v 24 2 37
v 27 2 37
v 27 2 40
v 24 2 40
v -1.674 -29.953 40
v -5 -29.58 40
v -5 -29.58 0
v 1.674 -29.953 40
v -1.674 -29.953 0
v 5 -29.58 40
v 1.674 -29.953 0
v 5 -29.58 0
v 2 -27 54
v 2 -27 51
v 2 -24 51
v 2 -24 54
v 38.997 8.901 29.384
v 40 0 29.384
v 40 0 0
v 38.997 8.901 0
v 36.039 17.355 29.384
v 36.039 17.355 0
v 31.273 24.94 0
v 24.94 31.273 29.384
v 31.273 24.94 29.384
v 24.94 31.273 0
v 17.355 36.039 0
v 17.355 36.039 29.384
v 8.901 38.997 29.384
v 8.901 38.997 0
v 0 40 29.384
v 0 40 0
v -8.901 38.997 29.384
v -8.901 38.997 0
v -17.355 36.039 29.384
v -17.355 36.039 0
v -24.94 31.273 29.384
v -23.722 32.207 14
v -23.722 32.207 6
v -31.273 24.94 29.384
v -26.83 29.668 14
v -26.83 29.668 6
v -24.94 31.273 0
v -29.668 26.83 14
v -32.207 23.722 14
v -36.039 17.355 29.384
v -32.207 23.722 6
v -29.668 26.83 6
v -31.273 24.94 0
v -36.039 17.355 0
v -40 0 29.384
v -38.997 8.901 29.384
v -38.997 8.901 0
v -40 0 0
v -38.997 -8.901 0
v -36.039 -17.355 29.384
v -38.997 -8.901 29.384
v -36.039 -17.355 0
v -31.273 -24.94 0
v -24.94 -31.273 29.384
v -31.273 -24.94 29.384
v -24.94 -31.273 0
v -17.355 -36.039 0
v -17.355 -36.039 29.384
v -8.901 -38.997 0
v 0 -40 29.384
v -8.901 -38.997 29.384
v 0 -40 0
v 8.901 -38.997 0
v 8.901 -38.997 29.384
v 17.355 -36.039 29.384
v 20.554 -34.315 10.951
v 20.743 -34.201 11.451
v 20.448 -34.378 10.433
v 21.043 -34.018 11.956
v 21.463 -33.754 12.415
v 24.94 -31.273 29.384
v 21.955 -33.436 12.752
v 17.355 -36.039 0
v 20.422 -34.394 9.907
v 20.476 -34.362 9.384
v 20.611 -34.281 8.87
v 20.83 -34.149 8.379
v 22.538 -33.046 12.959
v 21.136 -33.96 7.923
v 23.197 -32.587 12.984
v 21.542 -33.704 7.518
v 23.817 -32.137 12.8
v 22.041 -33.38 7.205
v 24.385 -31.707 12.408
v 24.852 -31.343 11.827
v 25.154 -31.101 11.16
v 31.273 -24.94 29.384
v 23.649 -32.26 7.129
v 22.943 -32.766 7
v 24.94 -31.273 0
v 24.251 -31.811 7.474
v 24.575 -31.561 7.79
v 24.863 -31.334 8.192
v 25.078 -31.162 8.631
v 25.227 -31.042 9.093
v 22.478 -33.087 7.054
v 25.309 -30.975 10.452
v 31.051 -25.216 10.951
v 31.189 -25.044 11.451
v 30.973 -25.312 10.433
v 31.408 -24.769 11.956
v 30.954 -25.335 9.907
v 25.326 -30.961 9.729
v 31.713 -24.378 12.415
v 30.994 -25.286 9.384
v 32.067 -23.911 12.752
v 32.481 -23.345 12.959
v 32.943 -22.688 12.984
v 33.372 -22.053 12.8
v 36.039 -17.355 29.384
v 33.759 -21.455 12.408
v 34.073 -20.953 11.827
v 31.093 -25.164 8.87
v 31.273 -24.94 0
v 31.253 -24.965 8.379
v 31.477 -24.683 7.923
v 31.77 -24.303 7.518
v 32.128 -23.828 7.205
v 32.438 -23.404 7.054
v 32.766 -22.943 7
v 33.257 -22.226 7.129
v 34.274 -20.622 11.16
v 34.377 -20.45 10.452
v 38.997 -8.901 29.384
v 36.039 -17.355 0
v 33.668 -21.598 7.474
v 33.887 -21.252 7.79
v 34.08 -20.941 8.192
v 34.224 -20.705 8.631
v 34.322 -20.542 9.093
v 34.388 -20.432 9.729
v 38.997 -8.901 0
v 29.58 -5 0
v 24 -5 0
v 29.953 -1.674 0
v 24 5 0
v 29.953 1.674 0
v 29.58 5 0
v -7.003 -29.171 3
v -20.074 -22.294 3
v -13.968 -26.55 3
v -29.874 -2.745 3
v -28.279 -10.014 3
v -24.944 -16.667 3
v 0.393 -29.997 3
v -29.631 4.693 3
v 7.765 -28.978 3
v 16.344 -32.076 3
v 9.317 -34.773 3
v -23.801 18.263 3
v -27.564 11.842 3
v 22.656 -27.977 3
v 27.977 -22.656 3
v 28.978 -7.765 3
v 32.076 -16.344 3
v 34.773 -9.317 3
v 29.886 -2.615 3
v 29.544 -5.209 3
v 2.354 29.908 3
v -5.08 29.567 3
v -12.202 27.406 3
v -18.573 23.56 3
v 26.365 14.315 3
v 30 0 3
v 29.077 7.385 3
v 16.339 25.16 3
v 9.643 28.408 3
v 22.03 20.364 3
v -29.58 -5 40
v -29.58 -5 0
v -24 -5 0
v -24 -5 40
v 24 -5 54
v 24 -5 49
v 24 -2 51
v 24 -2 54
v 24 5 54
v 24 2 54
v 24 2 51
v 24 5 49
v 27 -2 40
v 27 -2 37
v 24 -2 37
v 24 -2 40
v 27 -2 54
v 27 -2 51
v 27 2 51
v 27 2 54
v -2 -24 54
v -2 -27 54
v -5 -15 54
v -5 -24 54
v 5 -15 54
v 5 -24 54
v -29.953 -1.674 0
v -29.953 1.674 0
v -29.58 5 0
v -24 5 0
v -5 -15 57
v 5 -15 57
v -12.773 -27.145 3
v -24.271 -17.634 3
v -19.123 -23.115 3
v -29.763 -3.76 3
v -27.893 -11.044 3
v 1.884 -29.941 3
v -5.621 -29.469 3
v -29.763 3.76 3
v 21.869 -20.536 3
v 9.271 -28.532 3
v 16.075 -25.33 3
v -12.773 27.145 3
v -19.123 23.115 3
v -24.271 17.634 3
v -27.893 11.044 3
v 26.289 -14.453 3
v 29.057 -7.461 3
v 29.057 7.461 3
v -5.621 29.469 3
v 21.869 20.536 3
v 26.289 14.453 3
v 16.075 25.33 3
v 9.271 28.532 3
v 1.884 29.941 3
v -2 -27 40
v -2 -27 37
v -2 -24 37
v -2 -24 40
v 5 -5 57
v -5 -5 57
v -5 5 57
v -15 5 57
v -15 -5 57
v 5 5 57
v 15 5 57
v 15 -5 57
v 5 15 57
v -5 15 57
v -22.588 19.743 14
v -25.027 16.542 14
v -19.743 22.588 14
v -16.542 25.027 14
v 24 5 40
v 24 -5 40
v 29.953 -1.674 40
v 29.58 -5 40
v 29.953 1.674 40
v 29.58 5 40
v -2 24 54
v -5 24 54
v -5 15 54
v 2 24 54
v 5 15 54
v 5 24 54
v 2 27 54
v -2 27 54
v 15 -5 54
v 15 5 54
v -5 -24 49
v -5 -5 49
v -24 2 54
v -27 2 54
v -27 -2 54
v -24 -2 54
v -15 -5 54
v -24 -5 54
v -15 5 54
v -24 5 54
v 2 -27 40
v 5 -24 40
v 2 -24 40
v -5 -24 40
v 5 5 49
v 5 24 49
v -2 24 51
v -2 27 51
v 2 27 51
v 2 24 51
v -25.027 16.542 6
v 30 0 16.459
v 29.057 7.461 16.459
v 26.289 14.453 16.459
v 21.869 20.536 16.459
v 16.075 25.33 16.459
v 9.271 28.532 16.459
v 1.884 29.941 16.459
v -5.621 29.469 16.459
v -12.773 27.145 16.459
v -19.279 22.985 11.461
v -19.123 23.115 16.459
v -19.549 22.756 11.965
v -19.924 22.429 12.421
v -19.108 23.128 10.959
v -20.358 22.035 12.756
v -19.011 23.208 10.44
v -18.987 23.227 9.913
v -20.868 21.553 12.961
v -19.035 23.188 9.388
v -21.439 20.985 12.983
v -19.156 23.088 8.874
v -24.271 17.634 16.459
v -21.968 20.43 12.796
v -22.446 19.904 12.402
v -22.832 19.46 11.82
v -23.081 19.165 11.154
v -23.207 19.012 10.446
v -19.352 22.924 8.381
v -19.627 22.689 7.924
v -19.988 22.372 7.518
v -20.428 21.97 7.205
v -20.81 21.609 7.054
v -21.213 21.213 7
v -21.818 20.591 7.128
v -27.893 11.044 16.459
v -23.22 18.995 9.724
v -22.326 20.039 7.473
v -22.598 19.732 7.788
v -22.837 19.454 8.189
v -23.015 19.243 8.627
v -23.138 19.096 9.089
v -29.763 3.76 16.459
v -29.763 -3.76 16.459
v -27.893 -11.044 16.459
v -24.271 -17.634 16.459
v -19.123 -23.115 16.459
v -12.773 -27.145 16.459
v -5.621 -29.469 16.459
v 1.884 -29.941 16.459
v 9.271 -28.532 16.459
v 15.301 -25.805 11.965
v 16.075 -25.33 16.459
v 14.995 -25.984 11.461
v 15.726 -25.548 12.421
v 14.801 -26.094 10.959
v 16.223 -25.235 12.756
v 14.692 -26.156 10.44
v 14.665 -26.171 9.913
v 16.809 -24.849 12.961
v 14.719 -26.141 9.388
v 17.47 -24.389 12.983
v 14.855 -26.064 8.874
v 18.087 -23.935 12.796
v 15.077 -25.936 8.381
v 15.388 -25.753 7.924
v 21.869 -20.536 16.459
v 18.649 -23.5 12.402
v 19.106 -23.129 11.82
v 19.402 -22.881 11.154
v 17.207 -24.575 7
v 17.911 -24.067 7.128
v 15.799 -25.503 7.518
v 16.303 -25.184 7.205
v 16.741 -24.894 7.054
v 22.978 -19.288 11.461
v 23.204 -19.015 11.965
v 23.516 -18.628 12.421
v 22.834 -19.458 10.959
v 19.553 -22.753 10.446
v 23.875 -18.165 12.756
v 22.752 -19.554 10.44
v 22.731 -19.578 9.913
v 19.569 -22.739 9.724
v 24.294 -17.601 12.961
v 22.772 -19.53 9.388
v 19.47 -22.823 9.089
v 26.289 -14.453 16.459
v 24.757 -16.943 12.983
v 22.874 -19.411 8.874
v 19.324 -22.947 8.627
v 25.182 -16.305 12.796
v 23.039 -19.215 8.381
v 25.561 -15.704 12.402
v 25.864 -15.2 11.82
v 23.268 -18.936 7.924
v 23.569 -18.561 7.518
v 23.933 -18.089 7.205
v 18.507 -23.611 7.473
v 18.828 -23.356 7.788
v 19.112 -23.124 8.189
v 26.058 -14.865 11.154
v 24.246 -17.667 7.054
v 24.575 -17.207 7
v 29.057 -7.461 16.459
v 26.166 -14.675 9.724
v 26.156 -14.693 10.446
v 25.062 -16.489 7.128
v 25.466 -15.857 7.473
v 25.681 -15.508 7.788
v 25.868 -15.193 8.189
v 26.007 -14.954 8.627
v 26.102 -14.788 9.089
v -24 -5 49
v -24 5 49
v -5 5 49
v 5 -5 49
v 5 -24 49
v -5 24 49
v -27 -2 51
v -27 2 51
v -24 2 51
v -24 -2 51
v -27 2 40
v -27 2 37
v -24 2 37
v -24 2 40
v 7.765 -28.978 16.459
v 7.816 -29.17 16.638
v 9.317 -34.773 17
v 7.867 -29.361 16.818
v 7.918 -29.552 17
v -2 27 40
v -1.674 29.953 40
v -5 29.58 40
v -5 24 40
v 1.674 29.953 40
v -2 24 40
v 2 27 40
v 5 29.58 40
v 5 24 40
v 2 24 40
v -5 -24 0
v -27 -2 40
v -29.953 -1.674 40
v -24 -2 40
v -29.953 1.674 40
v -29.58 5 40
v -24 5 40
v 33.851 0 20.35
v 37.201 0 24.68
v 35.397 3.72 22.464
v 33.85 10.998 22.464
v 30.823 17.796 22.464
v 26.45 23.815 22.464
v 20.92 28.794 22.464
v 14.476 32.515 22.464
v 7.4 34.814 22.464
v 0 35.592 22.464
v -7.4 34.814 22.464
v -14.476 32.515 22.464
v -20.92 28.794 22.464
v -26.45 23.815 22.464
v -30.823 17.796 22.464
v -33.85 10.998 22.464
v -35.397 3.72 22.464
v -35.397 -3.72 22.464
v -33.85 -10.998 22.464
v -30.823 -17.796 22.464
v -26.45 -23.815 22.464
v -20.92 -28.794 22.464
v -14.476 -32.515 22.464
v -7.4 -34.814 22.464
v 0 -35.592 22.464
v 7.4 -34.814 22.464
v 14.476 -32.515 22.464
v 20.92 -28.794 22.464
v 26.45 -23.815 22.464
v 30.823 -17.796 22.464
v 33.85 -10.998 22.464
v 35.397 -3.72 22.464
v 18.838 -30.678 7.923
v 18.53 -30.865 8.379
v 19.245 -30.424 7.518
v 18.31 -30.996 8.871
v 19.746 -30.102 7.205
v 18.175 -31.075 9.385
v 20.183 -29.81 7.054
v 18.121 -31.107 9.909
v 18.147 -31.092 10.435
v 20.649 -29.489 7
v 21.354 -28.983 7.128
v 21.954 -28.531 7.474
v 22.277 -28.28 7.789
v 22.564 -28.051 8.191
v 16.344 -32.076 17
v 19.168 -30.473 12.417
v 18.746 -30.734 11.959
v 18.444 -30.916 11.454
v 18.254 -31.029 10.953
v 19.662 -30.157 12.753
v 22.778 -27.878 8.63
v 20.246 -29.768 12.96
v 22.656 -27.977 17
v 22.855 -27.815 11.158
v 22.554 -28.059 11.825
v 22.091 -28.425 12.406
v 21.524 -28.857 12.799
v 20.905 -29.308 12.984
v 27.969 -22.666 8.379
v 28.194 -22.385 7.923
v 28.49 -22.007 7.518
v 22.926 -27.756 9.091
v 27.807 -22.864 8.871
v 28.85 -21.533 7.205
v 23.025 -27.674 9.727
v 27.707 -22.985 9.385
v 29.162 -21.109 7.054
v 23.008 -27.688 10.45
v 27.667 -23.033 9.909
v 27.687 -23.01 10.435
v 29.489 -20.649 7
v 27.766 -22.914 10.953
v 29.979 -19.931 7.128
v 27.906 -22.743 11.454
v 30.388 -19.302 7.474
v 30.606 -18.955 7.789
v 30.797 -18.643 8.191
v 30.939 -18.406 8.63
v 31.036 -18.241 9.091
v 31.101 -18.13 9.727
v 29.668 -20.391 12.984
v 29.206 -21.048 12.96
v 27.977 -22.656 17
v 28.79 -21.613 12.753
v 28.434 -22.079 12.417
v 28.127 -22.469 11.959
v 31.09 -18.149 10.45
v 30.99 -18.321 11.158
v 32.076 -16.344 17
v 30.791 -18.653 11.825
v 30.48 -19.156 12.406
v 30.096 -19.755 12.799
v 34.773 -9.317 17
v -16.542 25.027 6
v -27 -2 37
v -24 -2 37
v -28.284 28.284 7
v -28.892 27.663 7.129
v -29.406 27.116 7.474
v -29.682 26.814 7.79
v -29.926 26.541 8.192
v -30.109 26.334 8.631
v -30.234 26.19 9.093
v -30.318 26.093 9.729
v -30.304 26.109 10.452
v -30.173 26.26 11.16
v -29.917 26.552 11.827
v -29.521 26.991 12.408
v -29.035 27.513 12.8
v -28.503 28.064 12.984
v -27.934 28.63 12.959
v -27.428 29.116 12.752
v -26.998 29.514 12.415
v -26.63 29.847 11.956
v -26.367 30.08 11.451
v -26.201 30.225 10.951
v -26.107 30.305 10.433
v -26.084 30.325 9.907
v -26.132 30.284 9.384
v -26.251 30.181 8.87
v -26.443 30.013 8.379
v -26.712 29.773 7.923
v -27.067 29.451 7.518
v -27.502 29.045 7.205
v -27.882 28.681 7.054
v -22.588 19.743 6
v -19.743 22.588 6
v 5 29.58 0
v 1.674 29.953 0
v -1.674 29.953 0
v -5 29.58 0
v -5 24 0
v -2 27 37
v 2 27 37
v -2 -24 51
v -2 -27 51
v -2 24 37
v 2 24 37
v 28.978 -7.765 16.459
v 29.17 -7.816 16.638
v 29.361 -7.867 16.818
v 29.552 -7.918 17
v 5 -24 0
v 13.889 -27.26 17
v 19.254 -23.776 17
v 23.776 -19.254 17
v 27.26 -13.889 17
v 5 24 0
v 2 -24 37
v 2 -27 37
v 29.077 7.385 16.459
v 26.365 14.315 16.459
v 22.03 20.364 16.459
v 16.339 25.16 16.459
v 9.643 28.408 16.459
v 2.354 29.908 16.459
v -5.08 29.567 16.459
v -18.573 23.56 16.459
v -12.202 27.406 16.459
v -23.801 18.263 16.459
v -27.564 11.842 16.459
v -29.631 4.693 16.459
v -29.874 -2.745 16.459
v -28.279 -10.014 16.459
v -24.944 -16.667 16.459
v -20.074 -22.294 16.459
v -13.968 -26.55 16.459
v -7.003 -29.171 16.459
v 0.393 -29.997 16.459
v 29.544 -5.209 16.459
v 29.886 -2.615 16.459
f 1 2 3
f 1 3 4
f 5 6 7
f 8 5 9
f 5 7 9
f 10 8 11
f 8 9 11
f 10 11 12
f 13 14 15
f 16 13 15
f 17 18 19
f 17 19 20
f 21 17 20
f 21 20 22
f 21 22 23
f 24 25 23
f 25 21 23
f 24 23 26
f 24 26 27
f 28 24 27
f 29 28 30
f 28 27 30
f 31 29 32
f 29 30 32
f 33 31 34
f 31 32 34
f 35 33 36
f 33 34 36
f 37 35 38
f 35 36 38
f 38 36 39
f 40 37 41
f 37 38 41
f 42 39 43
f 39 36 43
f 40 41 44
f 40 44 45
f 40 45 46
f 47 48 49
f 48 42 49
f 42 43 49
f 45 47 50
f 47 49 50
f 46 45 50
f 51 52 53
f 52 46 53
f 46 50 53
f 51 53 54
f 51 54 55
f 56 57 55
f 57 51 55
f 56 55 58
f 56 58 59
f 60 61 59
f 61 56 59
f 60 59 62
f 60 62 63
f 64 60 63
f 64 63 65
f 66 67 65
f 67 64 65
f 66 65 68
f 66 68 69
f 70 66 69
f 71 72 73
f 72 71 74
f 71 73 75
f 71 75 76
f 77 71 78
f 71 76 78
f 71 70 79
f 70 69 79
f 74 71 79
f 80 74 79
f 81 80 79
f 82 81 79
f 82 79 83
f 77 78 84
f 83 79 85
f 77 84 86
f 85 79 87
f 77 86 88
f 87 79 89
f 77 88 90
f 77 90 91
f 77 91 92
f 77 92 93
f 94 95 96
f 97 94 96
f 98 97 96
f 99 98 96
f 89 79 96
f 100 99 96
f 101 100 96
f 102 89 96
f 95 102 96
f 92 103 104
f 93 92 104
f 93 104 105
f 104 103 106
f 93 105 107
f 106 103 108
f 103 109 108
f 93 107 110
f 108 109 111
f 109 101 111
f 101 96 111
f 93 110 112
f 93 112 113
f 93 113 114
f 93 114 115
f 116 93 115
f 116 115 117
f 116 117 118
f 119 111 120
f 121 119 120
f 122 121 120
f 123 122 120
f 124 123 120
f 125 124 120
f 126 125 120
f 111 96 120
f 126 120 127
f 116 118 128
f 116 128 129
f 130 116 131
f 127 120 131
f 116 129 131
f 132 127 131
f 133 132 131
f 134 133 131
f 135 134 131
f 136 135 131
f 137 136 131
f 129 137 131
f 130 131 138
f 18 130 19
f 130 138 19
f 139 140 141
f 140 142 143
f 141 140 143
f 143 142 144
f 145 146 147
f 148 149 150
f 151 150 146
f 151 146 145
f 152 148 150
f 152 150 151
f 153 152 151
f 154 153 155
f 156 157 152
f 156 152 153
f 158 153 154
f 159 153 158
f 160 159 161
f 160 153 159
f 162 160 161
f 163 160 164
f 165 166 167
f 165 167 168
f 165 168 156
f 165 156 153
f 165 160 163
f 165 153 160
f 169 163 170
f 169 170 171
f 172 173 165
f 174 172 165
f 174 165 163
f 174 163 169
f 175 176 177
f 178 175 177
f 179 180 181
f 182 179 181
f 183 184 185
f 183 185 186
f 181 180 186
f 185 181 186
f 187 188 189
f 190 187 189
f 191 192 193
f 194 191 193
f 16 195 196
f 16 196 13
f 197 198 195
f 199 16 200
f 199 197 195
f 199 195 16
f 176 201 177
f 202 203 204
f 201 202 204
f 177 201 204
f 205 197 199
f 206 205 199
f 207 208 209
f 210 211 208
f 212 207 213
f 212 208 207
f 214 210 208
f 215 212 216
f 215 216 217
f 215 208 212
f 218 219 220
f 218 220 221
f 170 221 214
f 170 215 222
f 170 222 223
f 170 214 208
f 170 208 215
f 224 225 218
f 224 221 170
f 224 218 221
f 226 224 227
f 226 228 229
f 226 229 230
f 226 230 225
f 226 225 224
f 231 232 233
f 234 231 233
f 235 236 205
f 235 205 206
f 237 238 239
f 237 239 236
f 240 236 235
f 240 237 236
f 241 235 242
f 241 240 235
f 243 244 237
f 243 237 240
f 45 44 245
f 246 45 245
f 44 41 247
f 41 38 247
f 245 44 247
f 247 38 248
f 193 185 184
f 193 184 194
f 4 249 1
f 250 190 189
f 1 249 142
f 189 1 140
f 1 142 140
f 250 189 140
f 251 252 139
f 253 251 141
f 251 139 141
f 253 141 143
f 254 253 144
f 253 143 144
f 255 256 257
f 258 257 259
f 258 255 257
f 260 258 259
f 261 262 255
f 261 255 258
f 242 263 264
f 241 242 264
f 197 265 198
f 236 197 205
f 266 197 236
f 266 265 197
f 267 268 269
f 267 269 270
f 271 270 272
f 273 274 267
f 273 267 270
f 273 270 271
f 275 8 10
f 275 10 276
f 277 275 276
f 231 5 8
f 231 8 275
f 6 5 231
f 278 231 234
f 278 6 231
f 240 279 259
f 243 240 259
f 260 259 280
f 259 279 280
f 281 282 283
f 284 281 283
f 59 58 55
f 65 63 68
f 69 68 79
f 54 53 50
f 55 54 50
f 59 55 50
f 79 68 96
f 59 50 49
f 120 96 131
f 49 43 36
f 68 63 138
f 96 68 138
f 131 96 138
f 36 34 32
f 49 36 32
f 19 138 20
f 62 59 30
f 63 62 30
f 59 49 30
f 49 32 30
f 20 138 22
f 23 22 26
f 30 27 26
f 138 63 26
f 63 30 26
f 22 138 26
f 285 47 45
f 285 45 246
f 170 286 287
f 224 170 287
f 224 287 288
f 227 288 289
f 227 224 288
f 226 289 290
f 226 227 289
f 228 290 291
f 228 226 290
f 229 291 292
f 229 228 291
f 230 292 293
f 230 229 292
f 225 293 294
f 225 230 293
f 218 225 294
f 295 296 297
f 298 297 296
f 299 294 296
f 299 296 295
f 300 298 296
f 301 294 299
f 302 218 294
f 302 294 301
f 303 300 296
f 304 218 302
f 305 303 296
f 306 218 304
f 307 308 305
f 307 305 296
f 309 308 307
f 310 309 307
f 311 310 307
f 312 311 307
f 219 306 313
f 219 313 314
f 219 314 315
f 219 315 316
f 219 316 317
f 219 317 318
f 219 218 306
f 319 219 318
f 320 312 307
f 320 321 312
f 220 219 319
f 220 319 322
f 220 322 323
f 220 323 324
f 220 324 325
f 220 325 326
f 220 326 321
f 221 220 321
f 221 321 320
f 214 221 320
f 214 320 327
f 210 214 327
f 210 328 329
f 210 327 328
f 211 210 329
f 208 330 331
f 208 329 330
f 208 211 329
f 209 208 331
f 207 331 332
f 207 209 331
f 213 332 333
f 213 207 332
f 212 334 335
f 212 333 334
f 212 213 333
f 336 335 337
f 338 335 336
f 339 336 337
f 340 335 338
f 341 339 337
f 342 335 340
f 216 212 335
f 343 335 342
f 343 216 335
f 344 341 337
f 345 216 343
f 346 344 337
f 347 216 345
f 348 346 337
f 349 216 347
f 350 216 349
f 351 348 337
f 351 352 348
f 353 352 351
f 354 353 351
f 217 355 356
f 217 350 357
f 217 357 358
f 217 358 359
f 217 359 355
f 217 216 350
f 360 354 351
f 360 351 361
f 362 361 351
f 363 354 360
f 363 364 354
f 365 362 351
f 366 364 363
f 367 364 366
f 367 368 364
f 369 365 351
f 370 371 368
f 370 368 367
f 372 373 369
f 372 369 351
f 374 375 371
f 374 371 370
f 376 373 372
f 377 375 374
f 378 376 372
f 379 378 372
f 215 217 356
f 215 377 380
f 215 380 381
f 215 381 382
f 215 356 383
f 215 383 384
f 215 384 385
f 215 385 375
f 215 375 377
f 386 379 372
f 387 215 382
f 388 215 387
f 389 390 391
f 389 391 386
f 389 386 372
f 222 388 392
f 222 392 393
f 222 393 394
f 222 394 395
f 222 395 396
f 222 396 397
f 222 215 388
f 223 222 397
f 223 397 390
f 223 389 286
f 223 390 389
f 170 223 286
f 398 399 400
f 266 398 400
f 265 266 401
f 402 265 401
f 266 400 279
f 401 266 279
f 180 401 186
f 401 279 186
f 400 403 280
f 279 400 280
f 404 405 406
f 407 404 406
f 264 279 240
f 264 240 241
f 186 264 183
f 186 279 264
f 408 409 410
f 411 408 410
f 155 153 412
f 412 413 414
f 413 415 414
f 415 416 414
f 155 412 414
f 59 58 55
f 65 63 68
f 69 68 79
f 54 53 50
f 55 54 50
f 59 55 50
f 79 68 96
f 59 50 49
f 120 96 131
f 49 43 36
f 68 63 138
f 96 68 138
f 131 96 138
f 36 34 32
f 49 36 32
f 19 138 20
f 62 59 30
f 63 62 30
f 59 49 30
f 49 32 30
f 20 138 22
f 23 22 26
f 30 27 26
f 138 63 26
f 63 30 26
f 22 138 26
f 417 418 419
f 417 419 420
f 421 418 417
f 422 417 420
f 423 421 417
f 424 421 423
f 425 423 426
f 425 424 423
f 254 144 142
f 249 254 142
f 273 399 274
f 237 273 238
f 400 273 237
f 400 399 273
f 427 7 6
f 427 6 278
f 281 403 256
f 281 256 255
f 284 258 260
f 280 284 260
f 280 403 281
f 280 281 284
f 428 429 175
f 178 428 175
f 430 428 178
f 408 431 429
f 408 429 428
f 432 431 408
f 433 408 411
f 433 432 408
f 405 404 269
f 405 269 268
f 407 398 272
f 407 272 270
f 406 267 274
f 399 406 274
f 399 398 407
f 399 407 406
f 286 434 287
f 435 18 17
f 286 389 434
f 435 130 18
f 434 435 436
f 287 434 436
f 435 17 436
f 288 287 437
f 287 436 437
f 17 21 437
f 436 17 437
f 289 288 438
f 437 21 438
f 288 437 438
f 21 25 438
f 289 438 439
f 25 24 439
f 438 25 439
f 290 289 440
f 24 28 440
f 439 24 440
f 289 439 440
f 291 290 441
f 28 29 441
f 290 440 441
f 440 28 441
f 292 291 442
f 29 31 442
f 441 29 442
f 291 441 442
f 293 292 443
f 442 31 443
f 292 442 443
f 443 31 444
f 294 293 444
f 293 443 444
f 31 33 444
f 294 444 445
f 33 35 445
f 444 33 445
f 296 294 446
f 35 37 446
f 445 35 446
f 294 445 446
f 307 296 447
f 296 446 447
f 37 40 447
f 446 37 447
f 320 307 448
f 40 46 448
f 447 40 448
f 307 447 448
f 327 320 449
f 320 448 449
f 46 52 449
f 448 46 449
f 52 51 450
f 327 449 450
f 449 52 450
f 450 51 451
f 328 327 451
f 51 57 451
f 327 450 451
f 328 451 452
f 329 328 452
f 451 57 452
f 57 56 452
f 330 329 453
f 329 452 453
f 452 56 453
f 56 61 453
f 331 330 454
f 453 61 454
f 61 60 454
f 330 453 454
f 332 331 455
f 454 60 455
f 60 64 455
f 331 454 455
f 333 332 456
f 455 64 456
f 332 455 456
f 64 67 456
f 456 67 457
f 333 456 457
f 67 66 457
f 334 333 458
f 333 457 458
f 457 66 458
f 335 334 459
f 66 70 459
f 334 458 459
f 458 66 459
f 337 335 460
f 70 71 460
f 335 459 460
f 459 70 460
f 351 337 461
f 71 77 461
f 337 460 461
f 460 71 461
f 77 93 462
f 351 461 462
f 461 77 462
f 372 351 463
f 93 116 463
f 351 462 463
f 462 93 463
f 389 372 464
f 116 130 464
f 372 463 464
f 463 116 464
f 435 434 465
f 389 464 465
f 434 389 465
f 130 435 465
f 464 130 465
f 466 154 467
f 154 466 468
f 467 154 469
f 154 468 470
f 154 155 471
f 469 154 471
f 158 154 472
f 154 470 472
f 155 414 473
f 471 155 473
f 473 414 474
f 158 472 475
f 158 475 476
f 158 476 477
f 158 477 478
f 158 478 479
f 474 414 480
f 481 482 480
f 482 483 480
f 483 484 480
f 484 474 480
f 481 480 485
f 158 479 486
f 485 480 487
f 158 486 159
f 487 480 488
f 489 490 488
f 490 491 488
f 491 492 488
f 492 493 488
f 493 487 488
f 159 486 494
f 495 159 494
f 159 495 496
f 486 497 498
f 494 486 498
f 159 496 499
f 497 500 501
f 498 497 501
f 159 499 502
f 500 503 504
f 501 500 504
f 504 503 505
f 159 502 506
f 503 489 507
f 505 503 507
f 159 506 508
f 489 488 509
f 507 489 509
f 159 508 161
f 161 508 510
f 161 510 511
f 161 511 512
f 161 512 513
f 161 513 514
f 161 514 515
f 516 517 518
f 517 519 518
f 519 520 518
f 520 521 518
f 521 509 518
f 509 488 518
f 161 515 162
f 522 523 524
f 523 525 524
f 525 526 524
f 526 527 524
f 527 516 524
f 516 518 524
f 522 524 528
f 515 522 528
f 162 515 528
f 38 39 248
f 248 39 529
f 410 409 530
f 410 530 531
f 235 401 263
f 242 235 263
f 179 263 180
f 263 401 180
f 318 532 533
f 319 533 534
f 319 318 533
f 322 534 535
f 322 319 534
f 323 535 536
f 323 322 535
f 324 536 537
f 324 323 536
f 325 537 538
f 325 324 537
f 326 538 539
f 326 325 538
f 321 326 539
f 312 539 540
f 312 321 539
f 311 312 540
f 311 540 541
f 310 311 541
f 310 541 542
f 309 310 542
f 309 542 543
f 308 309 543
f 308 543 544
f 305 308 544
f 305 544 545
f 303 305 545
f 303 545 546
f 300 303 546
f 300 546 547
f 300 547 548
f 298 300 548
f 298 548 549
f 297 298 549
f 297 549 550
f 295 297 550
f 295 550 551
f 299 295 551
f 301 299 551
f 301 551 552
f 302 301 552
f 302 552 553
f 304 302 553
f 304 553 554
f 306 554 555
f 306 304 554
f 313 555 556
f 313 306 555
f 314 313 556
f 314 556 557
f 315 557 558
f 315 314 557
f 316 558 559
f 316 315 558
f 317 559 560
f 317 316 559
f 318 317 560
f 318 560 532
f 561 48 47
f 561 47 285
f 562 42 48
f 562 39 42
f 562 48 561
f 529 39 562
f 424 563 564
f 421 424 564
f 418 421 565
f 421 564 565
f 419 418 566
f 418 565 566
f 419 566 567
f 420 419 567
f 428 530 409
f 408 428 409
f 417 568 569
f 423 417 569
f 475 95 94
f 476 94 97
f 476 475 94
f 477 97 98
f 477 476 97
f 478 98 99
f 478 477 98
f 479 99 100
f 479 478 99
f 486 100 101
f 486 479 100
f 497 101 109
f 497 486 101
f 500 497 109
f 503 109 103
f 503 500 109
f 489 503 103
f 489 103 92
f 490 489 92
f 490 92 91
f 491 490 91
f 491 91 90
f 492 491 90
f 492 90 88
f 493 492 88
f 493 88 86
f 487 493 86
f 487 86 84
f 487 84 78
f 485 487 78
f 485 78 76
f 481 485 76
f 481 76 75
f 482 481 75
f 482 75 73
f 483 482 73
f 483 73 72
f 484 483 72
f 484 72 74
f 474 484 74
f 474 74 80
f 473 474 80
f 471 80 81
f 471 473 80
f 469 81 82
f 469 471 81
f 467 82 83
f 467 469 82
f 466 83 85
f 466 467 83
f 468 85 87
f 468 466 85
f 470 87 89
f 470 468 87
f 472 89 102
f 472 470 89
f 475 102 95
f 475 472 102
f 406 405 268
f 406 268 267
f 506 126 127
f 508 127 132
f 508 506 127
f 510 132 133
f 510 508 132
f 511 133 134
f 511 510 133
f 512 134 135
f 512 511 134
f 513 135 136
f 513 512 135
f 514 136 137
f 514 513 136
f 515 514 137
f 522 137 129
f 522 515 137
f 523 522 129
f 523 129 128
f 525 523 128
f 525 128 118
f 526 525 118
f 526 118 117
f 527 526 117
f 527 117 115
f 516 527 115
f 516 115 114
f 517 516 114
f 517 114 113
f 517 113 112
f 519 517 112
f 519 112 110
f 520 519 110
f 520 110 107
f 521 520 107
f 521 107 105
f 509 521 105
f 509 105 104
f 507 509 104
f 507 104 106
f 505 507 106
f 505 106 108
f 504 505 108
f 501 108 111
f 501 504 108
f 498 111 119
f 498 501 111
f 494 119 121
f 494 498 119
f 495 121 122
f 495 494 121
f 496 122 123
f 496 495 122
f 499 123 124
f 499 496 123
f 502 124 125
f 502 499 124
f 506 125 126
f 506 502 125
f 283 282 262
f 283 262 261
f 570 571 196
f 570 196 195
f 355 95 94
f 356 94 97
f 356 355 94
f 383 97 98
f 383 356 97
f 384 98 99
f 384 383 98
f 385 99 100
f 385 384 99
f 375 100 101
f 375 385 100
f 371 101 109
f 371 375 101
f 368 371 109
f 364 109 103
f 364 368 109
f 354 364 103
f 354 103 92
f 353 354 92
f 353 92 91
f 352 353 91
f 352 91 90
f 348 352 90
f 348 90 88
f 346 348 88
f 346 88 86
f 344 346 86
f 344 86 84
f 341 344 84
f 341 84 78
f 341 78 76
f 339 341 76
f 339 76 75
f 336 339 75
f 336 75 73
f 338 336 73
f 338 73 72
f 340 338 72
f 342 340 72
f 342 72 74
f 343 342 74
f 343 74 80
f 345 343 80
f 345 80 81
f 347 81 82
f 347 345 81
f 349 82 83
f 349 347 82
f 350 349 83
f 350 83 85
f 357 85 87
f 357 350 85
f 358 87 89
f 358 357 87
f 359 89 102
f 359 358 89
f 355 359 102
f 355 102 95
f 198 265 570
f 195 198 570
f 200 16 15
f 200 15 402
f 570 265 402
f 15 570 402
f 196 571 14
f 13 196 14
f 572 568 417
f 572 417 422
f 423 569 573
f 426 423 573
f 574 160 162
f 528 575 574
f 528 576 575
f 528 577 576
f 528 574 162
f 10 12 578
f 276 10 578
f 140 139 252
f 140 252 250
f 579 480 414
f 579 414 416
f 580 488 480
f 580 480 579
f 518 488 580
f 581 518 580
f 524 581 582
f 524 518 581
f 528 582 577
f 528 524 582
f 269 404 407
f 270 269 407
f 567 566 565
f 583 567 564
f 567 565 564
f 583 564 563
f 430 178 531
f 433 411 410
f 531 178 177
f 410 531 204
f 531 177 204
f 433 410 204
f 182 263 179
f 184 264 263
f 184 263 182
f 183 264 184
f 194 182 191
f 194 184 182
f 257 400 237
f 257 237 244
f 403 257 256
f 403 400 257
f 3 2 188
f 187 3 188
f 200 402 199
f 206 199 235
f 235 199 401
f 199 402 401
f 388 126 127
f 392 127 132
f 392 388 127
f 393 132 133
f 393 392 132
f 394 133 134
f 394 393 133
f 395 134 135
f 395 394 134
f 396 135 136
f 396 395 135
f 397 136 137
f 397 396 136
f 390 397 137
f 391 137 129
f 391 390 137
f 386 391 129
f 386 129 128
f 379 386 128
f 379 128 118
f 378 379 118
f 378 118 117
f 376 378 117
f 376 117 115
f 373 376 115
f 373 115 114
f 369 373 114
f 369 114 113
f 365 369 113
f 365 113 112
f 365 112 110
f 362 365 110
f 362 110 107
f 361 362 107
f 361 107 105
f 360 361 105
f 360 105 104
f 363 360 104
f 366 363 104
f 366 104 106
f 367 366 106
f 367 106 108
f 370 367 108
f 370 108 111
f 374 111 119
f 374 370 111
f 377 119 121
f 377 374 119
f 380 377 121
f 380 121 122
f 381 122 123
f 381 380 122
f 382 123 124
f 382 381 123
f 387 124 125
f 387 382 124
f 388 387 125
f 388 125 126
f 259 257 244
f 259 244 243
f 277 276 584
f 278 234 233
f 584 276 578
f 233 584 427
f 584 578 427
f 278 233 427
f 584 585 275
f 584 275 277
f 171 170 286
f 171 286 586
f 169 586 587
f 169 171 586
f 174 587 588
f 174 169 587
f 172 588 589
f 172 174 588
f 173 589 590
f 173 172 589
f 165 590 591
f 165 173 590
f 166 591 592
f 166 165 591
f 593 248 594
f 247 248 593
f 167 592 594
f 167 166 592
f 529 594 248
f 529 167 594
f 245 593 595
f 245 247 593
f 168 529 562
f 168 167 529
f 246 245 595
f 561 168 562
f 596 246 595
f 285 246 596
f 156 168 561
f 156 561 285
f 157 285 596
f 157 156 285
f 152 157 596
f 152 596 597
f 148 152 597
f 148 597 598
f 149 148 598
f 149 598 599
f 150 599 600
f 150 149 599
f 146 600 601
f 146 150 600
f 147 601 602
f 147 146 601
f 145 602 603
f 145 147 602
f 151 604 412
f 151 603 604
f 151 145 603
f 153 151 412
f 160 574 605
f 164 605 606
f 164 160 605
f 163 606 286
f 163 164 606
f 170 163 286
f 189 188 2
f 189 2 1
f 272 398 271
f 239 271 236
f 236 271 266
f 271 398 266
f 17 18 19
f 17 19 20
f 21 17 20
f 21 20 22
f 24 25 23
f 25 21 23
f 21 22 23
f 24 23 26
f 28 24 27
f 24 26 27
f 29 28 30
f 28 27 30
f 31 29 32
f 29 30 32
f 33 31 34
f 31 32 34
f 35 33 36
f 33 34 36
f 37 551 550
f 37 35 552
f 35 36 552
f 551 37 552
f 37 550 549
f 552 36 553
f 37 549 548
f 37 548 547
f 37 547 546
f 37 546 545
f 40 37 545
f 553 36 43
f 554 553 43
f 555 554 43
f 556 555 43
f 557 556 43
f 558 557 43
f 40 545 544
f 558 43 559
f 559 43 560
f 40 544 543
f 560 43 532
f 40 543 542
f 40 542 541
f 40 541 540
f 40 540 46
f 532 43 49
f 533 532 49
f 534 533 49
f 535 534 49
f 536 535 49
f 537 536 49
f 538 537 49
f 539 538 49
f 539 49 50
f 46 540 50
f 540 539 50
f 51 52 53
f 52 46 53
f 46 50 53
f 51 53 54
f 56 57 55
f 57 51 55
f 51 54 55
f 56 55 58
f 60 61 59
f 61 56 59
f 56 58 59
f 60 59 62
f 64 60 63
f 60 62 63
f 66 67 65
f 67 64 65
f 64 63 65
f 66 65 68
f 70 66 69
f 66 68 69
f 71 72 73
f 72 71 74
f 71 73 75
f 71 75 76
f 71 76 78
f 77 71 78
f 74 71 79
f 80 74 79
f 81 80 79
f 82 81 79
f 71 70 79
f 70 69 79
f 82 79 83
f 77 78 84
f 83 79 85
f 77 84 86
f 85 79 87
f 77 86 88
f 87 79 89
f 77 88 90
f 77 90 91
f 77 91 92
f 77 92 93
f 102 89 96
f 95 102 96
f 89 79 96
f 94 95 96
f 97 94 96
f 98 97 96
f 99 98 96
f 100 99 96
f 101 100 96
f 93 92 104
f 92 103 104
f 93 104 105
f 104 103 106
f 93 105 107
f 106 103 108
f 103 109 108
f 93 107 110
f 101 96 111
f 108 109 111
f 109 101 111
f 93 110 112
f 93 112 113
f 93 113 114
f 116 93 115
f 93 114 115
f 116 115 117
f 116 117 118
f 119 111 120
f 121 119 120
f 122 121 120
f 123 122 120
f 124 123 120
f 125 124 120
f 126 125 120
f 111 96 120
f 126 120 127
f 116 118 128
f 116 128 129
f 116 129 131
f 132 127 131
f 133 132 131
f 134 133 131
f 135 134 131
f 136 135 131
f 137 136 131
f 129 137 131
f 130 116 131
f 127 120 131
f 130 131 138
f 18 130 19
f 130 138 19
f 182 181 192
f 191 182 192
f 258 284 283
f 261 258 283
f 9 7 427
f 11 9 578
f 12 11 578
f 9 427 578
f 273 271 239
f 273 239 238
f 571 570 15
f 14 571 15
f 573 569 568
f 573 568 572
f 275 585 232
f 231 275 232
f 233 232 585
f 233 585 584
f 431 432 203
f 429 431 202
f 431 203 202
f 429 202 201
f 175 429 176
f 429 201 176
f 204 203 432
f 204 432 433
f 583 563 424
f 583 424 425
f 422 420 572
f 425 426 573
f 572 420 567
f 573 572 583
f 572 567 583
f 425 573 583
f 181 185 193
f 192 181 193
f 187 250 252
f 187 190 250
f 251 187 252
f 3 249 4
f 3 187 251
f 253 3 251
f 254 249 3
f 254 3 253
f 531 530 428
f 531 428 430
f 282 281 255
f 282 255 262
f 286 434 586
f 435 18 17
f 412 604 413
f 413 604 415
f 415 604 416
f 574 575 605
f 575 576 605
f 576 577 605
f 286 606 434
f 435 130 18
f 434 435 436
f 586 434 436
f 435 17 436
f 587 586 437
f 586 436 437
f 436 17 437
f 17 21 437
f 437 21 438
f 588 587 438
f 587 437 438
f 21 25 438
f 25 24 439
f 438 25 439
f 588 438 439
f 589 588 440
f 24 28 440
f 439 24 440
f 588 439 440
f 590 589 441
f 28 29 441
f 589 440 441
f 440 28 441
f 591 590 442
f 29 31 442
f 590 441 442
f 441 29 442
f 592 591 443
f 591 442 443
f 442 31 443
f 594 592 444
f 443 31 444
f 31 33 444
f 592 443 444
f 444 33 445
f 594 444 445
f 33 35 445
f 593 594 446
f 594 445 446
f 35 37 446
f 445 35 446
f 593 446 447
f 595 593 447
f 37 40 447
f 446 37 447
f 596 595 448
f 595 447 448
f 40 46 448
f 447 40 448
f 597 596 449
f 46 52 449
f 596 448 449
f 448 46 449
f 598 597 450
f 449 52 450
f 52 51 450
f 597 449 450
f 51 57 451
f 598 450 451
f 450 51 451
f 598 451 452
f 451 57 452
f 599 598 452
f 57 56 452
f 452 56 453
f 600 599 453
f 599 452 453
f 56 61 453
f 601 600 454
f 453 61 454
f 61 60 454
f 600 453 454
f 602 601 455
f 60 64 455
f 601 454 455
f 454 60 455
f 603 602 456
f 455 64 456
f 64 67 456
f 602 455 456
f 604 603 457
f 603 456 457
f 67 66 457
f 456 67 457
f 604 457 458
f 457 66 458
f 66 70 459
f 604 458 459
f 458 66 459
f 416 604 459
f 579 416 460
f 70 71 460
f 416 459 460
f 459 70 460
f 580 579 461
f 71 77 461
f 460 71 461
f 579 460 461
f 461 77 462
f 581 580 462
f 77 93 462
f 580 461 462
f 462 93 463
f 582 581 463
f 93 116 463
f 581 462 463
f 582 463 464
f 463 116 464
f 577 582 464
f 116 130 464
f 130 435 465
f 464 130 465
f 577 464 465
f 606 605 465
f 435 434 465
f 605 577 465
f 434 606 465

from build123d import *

# Parameters (mm, degrees)
CYLINDER003_R               = 3
CYLINDER003_DEPTH           = 12
CYLINDER003_PITCH_ANGLE     = 90
CYLINDER003_PLACEMENT_ANGLE = -35
CYLINDER002_R               = 3
CYLINDER002_DEPTH           = 12
CYLINDER002_PITCH_ANGLE     = 90
CYLINDER002_PLACEMENT_ANGLE = -55
CYLINDER004_R               = 3
CYLINDER004_DEPTH           = 12
CYLINDER004_PITCH_ANGLE     = 90
CYLINDER004_PLACEMENT_ANGLE = 135
CYLINDER001_R               = 30
CYLINDER001_DEPTH           = 30
CYLINDER_R                  = 40
CYLINDER_DEPTH              = 30
BOX007_W                    = 10
BOX007_H                    = 4
BOX007_DEPTH                = 10
BOX006_W                    = 6
BOX006_H                    = 10
BOX006_DEPTH                = 45
CUT008_PLACEMENT_ANGLE      = 180
CYLINDER005_R               = 30
CYLINDER005_DEPTH           = 40
BOX003_W                    = 10
BOX003_H                    = 4
BOX003_DEPTH                = 10
BOX002_W                    = 6
BOX002_H                    = 10
BOX002_DEPTH                = 45
CUT006_PLACEMENT_ANGLE      = 90
BOX001_W                    = 10
BOX001_H                    = 4
BOX001_DEPTH                = 10
BOX_W                       = 6
BOX_H                       = 10
BOX_DEPTH                   = 45
BOX005_W                    = 10
BOX005_H                    = 4
BOX005_DEPTH                = 10
BOX004_W                    = 6
BOX004_H                    = 10
BOX004_DEPTH                = 45
CUT007_PLACEMENT_ANGLE      = -90
CYLINDER006_R               = 40
CYLINDER006_DEPTH           = 20
BOX010_W                    = 3
BOX010_H                    = 4
BOX010_DEPTH                = 3
BOX011_W                    = 3
BOX011_H                    = 4
BOX011_DEPTH                = 3
BOX015_W                    = 30
BOX015_H                    = 10
BOX015_DEPTH                = 10
BOX009_W                    = 48
BOX009_H                    = 10
BOX009_DEPTH                = 10
BOX013_W                    = 4
BOX013_H                    = 3
BOX013_DEPTH                = 3
BOX012_W                    = 10
BOX012_H                    = 48
BOX012_DEPTH                = 10
BOX014_W                    = 4
BOX014_H                    = 3
BOX014_DEPTH                = 3
BOX016_W                    = 10
BOX016_H                    = 30
BOX016_DEPTH                = 10
CYLINDER007_W               = 36
CYLINDER007_H               = 14
CYLINDER007_ANGLE           = 60
CYLINDER007_PLACEMENT_ANGLE = 75
BOX008_W                    = 12
BOX008_H                    = 12
BOX008_DEPTH                = 8
BOX008_PLACEMENT_ANGLE      = -45


with BuildPart() as switch2:
    # Cylinder003 → Cylinder003 (new body)
    with BuildSketch(Plane.XY):
        Circle(CYLINDER003_R)
    extrude(amount=CYLINDER003_DEPTH)


with BuildPart() as switch2_1:
    # Cylinder003 pitch: moved
    add(switch2.part.rotate(Axis((0, 0, 0), (0, 1, 0)), CYLINDER003_PITCH_ANGLE))


with BuildPart() as switch2_2:
    # Cylinder003 placement: moved
    add(switch2_1.part.moved(Location((23.755409, -16.633717, 10))).rotate(Axis((23.755409, -16.633717, 10), (0, 0, 1)), CYLINDER003_PLACEMENT_ANGLE))


with BuildPart() as switch1:
    # Cylinder002 → Cylinder002 (new body)
    with BuildSketch(Plane.XY):
        Circle(CYLINDER002_R)
    extrude(amount=CYLINDER002_DEPTH)


with BuildPart() as switch1_1:
    # Cylinder002 pitch: moved
    add(switch1.part.rotate(Axis((0, 0, 0), (0, 1, 0)), CYLINDER002_PITCH_ANGLE))


with BuildPart() as switch1_2:
    # Cylinder002 placement: moved
    add(switch1_1.part.moved(Location((16.633717, -23.755409, 10))).rotate(Axis((16.633717, -23.755409, 10), (0, 0, 1)), CYLINDER002_PLACEMENT_ANGLE))


with BuildPart() as plug:
    # Cylinder004 → Cylinder004 (new body)
    with BuildSketch(Plane.XY):
        Circle(CYLINDER004_R)
    extrude(amount=CYLINDER004_DEPTH)


with BuildPart() as plug_1:
    # Cylinder004 pitch: moved
    add(plug.part.rotate(Axis((0, 0, 0), (0, 1, 0)), CYLINDER004_PITCH_ANGLE))


with BuildPart() as plug_2:
    # Cylinder004 placement: moved
    add(plug_1.part.moved(Location((-20.506097, 20.506097, 10))).rotate(Axis((-20.506097, 20.506097, 10), (0, 0, 1)), CYLINDER004_PLACEMENT_ANGLE))


with BuildPart() as sphere:
    # Sphere → Sphere (revolve)
    with BuildSketch(Plane(origin=(0, 0, 50), x_dir=(1, 0, 0), z_dir=(0, -1, 0))):
        with BuildLine():
            ThreePointArc((0, -45), (45, 0), (0, 45))
            Line((0, 45), (0, -45))
        make_face()
    revolve(axis=Axis((0, 0, 50), (0, 0, 1)))


with BuildPart() as cylinder001:
    # Cylinder001 → Cylinder001 (new body)
    with BuildSketch(Plane.XY.offset(3)):
        Circle(CYLINDER001_R)
    extrude(amount=CYLINDER001_DEPTH)


with BuildPart() as cut001:
    # Cylinder → Cylinder (new body)
    with BuildSketch(Plane.XY):
        Circle(CYLINDER_R)
    extrude(amount=CYLINDER_DEPTH)

    # Cut: cut Cylinder001
    add(cylinder001.part, mode=Mode.SUBTRACT)

    # Cut001: cut Sphere
    add(sphere.part, mode=Mode.SUBTRACT)


with BuildPart() as base_round:
    # Cut002 base: copy of Cut001
    add(cut001.part)

    # Cut002: cut plug
    add(plug_2.part, mode=Mode.SUBTRACT)

    # Cut003: cut switch1
    add(switch1_2.part, mode=Mode.SUBTRACT)

    # Cut004: cut switch2
    add(switch2_2.part, mode=Mode.SUBTRACT)


with BuildPart() as cube007:
    # Box007 → Box007 (new body)
    with BuildSketch(Plane(origin=(3, 3, 42), x_dir=(1, 0, 0), z_dir=(0, 0, 1))):
        with Locations((5, 2)):
            Rectangle(BOX007_W, BOX007_H)
    extrude(amount=BOX007_DEPTH)


with BuildPart() as cut008:
    # Box006 → Box006 (new body)
    with BuildSketch(Plane.XY):
        with Locations((3, 5)):
            Rectangle(BOX006_W, BOX006_H)
    extrude(amount=BOX006_DEPTH)

    # Cut008: cut Cube007
    add(cube007.part, mode=Mode.SUBTRACT)


with BuildPart() as cut008_1:
    # Cut008 placement: moved
    add(cut008.part.moved(Location((30, 5, -5))).rotate(Axis((30, 5, -5), (0, 0, 1)), CUT008_PLACEMENT_ANGLE))


with BuildPart() as cylinder002:
    # Cylinder005 → Cylinder005 (new body)
    with BuildSketch(Plane.XY):
        Circle(CYLINDER005_R)
    extrude(amount=CYLINDER005_DEPTH)


with BuildPart() as snap1:
    # Common base: copy of Cylinder002
    add(cylinder002.part)

    # Common: intersect Cut008
    add(cut008_1.part, mode=Mode.INTERSECT)


with BuildPart() as cube003:
    # Box003 → Box003 (new body)
    with BuildSketch(Plane(origin=(3, 3, 42), x_dir=(1, 0, 0), z_dir=(0, 0, 1))):
        with Locations((5, 2)):
            Rectangle(BOX003_W, BOX003_H)
    extrude(amount=BOX003_DEPTH)


with BuildPart() as snap2:
    # Box002 → Box002 (new body)
    with BuildSketch(Plane.XY):
        with Locations((3, 5)):
            Rectangle(BOX002_W, BOX002_H)
    extrude(amount=BOX002_DEPTH)

    # Cut006: cut Cube003
    add(cube003.part, mode=Mode.SUBTRACT)


with BuildPart() as snap2_1:
    # Cut006 placement: moved
    add(snap2.part.moved(Location((5, -30, -5))).rotate(Axis((5, -30, -5), (0, 0, 1)), CUT006_PLACEMENT_ANGLE))

    # Common001: intersect Cylinder002
    add(cylinder002.part, mode=Mode.INTERSECT)


with BuildPart() as cube001:
    # Box001 → Box001 (new body)
    with BuildSketch(Plane(origin=(3, 3, 42), x_dir=(1, 0, 0), z_dir=(0, 0, 1))):
        with Locations((5, 2)):
            Rectangle(BOX001_W, BOX001_H)
    extrude(amount=BOX001_DEPTH)


with BuildPart() as snap3:
    # Box → Box (new body)
    with BuildSketch(Plane.XY):
        with Locations((3, 5)):
            Rectangle(BOX_W, BOX_H)
    extrude(amount=BOX_DEPTH)

    # Cut005: cut Cube001
    add(cube001.part, mode=Mode.SUBTRACT)


with BuildPart() as snap3_1:
    # Cut005 placement: moved
    add(snap3.part.moved(Location((-30, -5, -5))))

    # Common002: intersect Cylinder002
    add(cylinder002.part, mode=Mode.INTERSECT)


with BuildPart() as cube005:
    # Box005 → Box005 (new body)
    with BuildSketch(Plane(origin=(3, 3, 42), x_dir=(1, 0, 0), z_dir=(0, 0, 1))):
        with Locations((5, 2)):
            Rectangle(BOX005_W, BOX005_H)
    extrude(amount=BOX005_DEPTH)


with BuildPart() as snap4:
    # Box004 → Box004 (new body)
    with BuildSketch(Plane.XY):
        with Locations((3, 5)):
            Rectangle(BOX004_W, BOX004_H)
    extrude(amount=BOX004_DEPTH)

    # Cut007: cut Cube005
    add(cube005.part, mode=Mode.SUBTRACT)


with BuildPart() as snap4_1:
    # Cut007 placement: moved
    add(snap4.part.moved(Location((-5, 30, -5))).rotate(Axis((-5, 30, -5), (0, 0, 1)), CUT007_PLACEMENT_ANGLE))

    # Common003: intersect Cylinder002
    add(cylinder002.part, mode=Mode.INTERSECT)


with BuildPart() as cylinder003:
    # Cylinder006 → Cylinder006 (new body)
    with BuildSketch(Plane.XY.offset(29)):
        Circle(CYLINDER006_R)
    extrude(amount=CYLINDER006_DEPTH)


with BuildPart() as cube010:
    # Box010 → Box010 (new body)
    with BuildSketch(Plane(origin=(-27, -2, 37), x_dir=(1, 0, 0), z_dir=(0, 0, 1))):
        with Locations((1.5, 2)):
            Rectangle(BOX010_W, BOX010_H)
    extrude(amount=BOX010_DEPTH)


with BuildPart() as cube011:
    # Box011 → Box011 (new body)
    with BuildSketch(Plane(origin=(24, -2, 37), x_dir=(1, 0, 0), z_dir=(0, 0, 1))):
        with Locations((1.5, 2)):
            Rectangle(BOX011_W, BOX011_H)
    extrude(amount=BOX011_DEPTH)


with BuildPart() as cube015:
    # Box015 → Box015 (new body)
    with BuildSketch(Plane(origin=(-15, -5, 33), x_dir=(1, 0, 0), z_dir=(0, 0, 1))):
        with Locations((15, 5)):
            Rectangle(BOX015_W, BOX015_H)
    extrude(amount=BOX015_DEPTH)


with BuildPart() as fusion:
    # Box009 → Box009 (new body)
    with BuildSketch(Plane(origin=(-24, -5, 30), x_dir=(1, 0, 0), z_dir=(0, 0, 1))):
        with Locations((24, 5)):
            Rectangle(BOX009_W, BOX009_H)
    extrude(amount=BOX009_DEPTH)

    # Fusion: union Cube010, Cube011, Cube015
    add(cube010.part)
    add(cube011.part)
    add(cube015.part)


with BuildPart() as cube013:
    # Box013 → Box013 (new body)
    with BuildSketch(Plane(origin=(-2, 24, 37), x_dir=(1, 0, 0), z_dir=(0, 0, 1))):
        with Locations((2, 1.5)):
            Rectangle(BOX013_W, BOX013_H)
    extrude(amount=BOX013_DEPTH)


with BuildPart() as cube012:
    # Box012 → Box012 (new body)
    with BuildSketch(Plane(origin=(-5, -24, 30), x_dir=(1, 0, 0), z_dir=(0, 0, 1))):
        with Locations((5, 24)):
            Rectangle(BOX012_W, BOX012_H)
    extrude(amount=BOX012_DEPTH)


with BuildPart() as cube014:
    # Box014 → Box014 (new body)
    with BuildSketch(Plane(origin=(-2, -27, 37), x_dir=(1, 0, 0), z_dir=(0, 0, 1))):
        with Locations((2, 1.5)):
            Rectangle(BOX014_W, BOX014_H)
    extrude(amount=BOX014_DEPTH)


with BuildPart() as led:
    # Box016 → Box016 (new body)
    with BuildSketch(Plane(origin=(-5, -15, 33), x_dir=(1, 0, 0), z_dir=(0, 0, 1))):
        with Locations((5, 15)):
            Rectangle(BOX016_W, BOX016_H)
    extrude(amount=BOX016_DEPTH)

    # Fusion001: union Cube013, Cube012, Cube014
    add(cube013.part)
    add(cube012.part)
    add(cube014.part)

    # Fusion002: union Fusion
    add(fusion.part)


with BuildPart() as led_1:
    # Fusion002 placement: moved
    add(led.part.moved(Location((0, 0, 14))))

    # Cut012: cut Cylinder003
    add(cylinder003.part, mode=Mode.SUBTRACT)


with BuildPart() as cylinder004:
    # Cylinder007 → Cylinder007 (revolve)
    with BuildSketch(Plane.XZ):
        with Locations((18, 7)):
            Rectangle(CYLINDER007_W, CYLINDER007_H)
    revolve(axis=Axis((0, 0, 0), (0, 0, 1)), revolution_arc=CYLINDER007_ANGLE)


with BuildPart() as cylinder004_1:
    # Cylinder007 placement: moved
    add(cylinder004.part.moved(Location((0, 0, 3))).rotate(Axis((0, 0, 3), (0, 0, -1)), CYLINDER007_PLACEMENT_ANGLE))


with BuildPart() as cube008:
    # Box008 → Box008 (new body)
    with BuildSketch(Plane.XY):
        with Locations((6, 6)):
            Rectangle(BOX008_W, BOX008_H)
    extrude(amount=BOX008_DEPTH)


with BuildPart() as cube008_1:
    # Box008 placement: moved
    add(cube008.part.moved(Location((-33.234019, 24.748737, 6))).rotate(Axis((-33.234019, 24.748737, 6), (0, 0, 1)), BOX008_PLACEMENT_ANGLE))


with BuildPart() as cut013:
    # Cut009 base: copy of Cut001
    add(cut001.part)

    # Cut009: cut switch1
    add(switch1_2.part, mode=Mode.SUBTRACT)

    # Cut010: cut switch2
    add(switch2_2.part, mode=Mode.SUBTRACT)

    # Cut011: cut Cube008
    add(cube008_1.part, mode=Mode.SUBTRACT)

    # Cut013: cut Cylinder004
    add(cylinder004_1.part, mode=Mode.SUBTRACT)


solid = Compound([base_round.part, snap1.part, snap2_1.part, snap3_1.part, snap4_1.part, led_1.part, cut013.part])
